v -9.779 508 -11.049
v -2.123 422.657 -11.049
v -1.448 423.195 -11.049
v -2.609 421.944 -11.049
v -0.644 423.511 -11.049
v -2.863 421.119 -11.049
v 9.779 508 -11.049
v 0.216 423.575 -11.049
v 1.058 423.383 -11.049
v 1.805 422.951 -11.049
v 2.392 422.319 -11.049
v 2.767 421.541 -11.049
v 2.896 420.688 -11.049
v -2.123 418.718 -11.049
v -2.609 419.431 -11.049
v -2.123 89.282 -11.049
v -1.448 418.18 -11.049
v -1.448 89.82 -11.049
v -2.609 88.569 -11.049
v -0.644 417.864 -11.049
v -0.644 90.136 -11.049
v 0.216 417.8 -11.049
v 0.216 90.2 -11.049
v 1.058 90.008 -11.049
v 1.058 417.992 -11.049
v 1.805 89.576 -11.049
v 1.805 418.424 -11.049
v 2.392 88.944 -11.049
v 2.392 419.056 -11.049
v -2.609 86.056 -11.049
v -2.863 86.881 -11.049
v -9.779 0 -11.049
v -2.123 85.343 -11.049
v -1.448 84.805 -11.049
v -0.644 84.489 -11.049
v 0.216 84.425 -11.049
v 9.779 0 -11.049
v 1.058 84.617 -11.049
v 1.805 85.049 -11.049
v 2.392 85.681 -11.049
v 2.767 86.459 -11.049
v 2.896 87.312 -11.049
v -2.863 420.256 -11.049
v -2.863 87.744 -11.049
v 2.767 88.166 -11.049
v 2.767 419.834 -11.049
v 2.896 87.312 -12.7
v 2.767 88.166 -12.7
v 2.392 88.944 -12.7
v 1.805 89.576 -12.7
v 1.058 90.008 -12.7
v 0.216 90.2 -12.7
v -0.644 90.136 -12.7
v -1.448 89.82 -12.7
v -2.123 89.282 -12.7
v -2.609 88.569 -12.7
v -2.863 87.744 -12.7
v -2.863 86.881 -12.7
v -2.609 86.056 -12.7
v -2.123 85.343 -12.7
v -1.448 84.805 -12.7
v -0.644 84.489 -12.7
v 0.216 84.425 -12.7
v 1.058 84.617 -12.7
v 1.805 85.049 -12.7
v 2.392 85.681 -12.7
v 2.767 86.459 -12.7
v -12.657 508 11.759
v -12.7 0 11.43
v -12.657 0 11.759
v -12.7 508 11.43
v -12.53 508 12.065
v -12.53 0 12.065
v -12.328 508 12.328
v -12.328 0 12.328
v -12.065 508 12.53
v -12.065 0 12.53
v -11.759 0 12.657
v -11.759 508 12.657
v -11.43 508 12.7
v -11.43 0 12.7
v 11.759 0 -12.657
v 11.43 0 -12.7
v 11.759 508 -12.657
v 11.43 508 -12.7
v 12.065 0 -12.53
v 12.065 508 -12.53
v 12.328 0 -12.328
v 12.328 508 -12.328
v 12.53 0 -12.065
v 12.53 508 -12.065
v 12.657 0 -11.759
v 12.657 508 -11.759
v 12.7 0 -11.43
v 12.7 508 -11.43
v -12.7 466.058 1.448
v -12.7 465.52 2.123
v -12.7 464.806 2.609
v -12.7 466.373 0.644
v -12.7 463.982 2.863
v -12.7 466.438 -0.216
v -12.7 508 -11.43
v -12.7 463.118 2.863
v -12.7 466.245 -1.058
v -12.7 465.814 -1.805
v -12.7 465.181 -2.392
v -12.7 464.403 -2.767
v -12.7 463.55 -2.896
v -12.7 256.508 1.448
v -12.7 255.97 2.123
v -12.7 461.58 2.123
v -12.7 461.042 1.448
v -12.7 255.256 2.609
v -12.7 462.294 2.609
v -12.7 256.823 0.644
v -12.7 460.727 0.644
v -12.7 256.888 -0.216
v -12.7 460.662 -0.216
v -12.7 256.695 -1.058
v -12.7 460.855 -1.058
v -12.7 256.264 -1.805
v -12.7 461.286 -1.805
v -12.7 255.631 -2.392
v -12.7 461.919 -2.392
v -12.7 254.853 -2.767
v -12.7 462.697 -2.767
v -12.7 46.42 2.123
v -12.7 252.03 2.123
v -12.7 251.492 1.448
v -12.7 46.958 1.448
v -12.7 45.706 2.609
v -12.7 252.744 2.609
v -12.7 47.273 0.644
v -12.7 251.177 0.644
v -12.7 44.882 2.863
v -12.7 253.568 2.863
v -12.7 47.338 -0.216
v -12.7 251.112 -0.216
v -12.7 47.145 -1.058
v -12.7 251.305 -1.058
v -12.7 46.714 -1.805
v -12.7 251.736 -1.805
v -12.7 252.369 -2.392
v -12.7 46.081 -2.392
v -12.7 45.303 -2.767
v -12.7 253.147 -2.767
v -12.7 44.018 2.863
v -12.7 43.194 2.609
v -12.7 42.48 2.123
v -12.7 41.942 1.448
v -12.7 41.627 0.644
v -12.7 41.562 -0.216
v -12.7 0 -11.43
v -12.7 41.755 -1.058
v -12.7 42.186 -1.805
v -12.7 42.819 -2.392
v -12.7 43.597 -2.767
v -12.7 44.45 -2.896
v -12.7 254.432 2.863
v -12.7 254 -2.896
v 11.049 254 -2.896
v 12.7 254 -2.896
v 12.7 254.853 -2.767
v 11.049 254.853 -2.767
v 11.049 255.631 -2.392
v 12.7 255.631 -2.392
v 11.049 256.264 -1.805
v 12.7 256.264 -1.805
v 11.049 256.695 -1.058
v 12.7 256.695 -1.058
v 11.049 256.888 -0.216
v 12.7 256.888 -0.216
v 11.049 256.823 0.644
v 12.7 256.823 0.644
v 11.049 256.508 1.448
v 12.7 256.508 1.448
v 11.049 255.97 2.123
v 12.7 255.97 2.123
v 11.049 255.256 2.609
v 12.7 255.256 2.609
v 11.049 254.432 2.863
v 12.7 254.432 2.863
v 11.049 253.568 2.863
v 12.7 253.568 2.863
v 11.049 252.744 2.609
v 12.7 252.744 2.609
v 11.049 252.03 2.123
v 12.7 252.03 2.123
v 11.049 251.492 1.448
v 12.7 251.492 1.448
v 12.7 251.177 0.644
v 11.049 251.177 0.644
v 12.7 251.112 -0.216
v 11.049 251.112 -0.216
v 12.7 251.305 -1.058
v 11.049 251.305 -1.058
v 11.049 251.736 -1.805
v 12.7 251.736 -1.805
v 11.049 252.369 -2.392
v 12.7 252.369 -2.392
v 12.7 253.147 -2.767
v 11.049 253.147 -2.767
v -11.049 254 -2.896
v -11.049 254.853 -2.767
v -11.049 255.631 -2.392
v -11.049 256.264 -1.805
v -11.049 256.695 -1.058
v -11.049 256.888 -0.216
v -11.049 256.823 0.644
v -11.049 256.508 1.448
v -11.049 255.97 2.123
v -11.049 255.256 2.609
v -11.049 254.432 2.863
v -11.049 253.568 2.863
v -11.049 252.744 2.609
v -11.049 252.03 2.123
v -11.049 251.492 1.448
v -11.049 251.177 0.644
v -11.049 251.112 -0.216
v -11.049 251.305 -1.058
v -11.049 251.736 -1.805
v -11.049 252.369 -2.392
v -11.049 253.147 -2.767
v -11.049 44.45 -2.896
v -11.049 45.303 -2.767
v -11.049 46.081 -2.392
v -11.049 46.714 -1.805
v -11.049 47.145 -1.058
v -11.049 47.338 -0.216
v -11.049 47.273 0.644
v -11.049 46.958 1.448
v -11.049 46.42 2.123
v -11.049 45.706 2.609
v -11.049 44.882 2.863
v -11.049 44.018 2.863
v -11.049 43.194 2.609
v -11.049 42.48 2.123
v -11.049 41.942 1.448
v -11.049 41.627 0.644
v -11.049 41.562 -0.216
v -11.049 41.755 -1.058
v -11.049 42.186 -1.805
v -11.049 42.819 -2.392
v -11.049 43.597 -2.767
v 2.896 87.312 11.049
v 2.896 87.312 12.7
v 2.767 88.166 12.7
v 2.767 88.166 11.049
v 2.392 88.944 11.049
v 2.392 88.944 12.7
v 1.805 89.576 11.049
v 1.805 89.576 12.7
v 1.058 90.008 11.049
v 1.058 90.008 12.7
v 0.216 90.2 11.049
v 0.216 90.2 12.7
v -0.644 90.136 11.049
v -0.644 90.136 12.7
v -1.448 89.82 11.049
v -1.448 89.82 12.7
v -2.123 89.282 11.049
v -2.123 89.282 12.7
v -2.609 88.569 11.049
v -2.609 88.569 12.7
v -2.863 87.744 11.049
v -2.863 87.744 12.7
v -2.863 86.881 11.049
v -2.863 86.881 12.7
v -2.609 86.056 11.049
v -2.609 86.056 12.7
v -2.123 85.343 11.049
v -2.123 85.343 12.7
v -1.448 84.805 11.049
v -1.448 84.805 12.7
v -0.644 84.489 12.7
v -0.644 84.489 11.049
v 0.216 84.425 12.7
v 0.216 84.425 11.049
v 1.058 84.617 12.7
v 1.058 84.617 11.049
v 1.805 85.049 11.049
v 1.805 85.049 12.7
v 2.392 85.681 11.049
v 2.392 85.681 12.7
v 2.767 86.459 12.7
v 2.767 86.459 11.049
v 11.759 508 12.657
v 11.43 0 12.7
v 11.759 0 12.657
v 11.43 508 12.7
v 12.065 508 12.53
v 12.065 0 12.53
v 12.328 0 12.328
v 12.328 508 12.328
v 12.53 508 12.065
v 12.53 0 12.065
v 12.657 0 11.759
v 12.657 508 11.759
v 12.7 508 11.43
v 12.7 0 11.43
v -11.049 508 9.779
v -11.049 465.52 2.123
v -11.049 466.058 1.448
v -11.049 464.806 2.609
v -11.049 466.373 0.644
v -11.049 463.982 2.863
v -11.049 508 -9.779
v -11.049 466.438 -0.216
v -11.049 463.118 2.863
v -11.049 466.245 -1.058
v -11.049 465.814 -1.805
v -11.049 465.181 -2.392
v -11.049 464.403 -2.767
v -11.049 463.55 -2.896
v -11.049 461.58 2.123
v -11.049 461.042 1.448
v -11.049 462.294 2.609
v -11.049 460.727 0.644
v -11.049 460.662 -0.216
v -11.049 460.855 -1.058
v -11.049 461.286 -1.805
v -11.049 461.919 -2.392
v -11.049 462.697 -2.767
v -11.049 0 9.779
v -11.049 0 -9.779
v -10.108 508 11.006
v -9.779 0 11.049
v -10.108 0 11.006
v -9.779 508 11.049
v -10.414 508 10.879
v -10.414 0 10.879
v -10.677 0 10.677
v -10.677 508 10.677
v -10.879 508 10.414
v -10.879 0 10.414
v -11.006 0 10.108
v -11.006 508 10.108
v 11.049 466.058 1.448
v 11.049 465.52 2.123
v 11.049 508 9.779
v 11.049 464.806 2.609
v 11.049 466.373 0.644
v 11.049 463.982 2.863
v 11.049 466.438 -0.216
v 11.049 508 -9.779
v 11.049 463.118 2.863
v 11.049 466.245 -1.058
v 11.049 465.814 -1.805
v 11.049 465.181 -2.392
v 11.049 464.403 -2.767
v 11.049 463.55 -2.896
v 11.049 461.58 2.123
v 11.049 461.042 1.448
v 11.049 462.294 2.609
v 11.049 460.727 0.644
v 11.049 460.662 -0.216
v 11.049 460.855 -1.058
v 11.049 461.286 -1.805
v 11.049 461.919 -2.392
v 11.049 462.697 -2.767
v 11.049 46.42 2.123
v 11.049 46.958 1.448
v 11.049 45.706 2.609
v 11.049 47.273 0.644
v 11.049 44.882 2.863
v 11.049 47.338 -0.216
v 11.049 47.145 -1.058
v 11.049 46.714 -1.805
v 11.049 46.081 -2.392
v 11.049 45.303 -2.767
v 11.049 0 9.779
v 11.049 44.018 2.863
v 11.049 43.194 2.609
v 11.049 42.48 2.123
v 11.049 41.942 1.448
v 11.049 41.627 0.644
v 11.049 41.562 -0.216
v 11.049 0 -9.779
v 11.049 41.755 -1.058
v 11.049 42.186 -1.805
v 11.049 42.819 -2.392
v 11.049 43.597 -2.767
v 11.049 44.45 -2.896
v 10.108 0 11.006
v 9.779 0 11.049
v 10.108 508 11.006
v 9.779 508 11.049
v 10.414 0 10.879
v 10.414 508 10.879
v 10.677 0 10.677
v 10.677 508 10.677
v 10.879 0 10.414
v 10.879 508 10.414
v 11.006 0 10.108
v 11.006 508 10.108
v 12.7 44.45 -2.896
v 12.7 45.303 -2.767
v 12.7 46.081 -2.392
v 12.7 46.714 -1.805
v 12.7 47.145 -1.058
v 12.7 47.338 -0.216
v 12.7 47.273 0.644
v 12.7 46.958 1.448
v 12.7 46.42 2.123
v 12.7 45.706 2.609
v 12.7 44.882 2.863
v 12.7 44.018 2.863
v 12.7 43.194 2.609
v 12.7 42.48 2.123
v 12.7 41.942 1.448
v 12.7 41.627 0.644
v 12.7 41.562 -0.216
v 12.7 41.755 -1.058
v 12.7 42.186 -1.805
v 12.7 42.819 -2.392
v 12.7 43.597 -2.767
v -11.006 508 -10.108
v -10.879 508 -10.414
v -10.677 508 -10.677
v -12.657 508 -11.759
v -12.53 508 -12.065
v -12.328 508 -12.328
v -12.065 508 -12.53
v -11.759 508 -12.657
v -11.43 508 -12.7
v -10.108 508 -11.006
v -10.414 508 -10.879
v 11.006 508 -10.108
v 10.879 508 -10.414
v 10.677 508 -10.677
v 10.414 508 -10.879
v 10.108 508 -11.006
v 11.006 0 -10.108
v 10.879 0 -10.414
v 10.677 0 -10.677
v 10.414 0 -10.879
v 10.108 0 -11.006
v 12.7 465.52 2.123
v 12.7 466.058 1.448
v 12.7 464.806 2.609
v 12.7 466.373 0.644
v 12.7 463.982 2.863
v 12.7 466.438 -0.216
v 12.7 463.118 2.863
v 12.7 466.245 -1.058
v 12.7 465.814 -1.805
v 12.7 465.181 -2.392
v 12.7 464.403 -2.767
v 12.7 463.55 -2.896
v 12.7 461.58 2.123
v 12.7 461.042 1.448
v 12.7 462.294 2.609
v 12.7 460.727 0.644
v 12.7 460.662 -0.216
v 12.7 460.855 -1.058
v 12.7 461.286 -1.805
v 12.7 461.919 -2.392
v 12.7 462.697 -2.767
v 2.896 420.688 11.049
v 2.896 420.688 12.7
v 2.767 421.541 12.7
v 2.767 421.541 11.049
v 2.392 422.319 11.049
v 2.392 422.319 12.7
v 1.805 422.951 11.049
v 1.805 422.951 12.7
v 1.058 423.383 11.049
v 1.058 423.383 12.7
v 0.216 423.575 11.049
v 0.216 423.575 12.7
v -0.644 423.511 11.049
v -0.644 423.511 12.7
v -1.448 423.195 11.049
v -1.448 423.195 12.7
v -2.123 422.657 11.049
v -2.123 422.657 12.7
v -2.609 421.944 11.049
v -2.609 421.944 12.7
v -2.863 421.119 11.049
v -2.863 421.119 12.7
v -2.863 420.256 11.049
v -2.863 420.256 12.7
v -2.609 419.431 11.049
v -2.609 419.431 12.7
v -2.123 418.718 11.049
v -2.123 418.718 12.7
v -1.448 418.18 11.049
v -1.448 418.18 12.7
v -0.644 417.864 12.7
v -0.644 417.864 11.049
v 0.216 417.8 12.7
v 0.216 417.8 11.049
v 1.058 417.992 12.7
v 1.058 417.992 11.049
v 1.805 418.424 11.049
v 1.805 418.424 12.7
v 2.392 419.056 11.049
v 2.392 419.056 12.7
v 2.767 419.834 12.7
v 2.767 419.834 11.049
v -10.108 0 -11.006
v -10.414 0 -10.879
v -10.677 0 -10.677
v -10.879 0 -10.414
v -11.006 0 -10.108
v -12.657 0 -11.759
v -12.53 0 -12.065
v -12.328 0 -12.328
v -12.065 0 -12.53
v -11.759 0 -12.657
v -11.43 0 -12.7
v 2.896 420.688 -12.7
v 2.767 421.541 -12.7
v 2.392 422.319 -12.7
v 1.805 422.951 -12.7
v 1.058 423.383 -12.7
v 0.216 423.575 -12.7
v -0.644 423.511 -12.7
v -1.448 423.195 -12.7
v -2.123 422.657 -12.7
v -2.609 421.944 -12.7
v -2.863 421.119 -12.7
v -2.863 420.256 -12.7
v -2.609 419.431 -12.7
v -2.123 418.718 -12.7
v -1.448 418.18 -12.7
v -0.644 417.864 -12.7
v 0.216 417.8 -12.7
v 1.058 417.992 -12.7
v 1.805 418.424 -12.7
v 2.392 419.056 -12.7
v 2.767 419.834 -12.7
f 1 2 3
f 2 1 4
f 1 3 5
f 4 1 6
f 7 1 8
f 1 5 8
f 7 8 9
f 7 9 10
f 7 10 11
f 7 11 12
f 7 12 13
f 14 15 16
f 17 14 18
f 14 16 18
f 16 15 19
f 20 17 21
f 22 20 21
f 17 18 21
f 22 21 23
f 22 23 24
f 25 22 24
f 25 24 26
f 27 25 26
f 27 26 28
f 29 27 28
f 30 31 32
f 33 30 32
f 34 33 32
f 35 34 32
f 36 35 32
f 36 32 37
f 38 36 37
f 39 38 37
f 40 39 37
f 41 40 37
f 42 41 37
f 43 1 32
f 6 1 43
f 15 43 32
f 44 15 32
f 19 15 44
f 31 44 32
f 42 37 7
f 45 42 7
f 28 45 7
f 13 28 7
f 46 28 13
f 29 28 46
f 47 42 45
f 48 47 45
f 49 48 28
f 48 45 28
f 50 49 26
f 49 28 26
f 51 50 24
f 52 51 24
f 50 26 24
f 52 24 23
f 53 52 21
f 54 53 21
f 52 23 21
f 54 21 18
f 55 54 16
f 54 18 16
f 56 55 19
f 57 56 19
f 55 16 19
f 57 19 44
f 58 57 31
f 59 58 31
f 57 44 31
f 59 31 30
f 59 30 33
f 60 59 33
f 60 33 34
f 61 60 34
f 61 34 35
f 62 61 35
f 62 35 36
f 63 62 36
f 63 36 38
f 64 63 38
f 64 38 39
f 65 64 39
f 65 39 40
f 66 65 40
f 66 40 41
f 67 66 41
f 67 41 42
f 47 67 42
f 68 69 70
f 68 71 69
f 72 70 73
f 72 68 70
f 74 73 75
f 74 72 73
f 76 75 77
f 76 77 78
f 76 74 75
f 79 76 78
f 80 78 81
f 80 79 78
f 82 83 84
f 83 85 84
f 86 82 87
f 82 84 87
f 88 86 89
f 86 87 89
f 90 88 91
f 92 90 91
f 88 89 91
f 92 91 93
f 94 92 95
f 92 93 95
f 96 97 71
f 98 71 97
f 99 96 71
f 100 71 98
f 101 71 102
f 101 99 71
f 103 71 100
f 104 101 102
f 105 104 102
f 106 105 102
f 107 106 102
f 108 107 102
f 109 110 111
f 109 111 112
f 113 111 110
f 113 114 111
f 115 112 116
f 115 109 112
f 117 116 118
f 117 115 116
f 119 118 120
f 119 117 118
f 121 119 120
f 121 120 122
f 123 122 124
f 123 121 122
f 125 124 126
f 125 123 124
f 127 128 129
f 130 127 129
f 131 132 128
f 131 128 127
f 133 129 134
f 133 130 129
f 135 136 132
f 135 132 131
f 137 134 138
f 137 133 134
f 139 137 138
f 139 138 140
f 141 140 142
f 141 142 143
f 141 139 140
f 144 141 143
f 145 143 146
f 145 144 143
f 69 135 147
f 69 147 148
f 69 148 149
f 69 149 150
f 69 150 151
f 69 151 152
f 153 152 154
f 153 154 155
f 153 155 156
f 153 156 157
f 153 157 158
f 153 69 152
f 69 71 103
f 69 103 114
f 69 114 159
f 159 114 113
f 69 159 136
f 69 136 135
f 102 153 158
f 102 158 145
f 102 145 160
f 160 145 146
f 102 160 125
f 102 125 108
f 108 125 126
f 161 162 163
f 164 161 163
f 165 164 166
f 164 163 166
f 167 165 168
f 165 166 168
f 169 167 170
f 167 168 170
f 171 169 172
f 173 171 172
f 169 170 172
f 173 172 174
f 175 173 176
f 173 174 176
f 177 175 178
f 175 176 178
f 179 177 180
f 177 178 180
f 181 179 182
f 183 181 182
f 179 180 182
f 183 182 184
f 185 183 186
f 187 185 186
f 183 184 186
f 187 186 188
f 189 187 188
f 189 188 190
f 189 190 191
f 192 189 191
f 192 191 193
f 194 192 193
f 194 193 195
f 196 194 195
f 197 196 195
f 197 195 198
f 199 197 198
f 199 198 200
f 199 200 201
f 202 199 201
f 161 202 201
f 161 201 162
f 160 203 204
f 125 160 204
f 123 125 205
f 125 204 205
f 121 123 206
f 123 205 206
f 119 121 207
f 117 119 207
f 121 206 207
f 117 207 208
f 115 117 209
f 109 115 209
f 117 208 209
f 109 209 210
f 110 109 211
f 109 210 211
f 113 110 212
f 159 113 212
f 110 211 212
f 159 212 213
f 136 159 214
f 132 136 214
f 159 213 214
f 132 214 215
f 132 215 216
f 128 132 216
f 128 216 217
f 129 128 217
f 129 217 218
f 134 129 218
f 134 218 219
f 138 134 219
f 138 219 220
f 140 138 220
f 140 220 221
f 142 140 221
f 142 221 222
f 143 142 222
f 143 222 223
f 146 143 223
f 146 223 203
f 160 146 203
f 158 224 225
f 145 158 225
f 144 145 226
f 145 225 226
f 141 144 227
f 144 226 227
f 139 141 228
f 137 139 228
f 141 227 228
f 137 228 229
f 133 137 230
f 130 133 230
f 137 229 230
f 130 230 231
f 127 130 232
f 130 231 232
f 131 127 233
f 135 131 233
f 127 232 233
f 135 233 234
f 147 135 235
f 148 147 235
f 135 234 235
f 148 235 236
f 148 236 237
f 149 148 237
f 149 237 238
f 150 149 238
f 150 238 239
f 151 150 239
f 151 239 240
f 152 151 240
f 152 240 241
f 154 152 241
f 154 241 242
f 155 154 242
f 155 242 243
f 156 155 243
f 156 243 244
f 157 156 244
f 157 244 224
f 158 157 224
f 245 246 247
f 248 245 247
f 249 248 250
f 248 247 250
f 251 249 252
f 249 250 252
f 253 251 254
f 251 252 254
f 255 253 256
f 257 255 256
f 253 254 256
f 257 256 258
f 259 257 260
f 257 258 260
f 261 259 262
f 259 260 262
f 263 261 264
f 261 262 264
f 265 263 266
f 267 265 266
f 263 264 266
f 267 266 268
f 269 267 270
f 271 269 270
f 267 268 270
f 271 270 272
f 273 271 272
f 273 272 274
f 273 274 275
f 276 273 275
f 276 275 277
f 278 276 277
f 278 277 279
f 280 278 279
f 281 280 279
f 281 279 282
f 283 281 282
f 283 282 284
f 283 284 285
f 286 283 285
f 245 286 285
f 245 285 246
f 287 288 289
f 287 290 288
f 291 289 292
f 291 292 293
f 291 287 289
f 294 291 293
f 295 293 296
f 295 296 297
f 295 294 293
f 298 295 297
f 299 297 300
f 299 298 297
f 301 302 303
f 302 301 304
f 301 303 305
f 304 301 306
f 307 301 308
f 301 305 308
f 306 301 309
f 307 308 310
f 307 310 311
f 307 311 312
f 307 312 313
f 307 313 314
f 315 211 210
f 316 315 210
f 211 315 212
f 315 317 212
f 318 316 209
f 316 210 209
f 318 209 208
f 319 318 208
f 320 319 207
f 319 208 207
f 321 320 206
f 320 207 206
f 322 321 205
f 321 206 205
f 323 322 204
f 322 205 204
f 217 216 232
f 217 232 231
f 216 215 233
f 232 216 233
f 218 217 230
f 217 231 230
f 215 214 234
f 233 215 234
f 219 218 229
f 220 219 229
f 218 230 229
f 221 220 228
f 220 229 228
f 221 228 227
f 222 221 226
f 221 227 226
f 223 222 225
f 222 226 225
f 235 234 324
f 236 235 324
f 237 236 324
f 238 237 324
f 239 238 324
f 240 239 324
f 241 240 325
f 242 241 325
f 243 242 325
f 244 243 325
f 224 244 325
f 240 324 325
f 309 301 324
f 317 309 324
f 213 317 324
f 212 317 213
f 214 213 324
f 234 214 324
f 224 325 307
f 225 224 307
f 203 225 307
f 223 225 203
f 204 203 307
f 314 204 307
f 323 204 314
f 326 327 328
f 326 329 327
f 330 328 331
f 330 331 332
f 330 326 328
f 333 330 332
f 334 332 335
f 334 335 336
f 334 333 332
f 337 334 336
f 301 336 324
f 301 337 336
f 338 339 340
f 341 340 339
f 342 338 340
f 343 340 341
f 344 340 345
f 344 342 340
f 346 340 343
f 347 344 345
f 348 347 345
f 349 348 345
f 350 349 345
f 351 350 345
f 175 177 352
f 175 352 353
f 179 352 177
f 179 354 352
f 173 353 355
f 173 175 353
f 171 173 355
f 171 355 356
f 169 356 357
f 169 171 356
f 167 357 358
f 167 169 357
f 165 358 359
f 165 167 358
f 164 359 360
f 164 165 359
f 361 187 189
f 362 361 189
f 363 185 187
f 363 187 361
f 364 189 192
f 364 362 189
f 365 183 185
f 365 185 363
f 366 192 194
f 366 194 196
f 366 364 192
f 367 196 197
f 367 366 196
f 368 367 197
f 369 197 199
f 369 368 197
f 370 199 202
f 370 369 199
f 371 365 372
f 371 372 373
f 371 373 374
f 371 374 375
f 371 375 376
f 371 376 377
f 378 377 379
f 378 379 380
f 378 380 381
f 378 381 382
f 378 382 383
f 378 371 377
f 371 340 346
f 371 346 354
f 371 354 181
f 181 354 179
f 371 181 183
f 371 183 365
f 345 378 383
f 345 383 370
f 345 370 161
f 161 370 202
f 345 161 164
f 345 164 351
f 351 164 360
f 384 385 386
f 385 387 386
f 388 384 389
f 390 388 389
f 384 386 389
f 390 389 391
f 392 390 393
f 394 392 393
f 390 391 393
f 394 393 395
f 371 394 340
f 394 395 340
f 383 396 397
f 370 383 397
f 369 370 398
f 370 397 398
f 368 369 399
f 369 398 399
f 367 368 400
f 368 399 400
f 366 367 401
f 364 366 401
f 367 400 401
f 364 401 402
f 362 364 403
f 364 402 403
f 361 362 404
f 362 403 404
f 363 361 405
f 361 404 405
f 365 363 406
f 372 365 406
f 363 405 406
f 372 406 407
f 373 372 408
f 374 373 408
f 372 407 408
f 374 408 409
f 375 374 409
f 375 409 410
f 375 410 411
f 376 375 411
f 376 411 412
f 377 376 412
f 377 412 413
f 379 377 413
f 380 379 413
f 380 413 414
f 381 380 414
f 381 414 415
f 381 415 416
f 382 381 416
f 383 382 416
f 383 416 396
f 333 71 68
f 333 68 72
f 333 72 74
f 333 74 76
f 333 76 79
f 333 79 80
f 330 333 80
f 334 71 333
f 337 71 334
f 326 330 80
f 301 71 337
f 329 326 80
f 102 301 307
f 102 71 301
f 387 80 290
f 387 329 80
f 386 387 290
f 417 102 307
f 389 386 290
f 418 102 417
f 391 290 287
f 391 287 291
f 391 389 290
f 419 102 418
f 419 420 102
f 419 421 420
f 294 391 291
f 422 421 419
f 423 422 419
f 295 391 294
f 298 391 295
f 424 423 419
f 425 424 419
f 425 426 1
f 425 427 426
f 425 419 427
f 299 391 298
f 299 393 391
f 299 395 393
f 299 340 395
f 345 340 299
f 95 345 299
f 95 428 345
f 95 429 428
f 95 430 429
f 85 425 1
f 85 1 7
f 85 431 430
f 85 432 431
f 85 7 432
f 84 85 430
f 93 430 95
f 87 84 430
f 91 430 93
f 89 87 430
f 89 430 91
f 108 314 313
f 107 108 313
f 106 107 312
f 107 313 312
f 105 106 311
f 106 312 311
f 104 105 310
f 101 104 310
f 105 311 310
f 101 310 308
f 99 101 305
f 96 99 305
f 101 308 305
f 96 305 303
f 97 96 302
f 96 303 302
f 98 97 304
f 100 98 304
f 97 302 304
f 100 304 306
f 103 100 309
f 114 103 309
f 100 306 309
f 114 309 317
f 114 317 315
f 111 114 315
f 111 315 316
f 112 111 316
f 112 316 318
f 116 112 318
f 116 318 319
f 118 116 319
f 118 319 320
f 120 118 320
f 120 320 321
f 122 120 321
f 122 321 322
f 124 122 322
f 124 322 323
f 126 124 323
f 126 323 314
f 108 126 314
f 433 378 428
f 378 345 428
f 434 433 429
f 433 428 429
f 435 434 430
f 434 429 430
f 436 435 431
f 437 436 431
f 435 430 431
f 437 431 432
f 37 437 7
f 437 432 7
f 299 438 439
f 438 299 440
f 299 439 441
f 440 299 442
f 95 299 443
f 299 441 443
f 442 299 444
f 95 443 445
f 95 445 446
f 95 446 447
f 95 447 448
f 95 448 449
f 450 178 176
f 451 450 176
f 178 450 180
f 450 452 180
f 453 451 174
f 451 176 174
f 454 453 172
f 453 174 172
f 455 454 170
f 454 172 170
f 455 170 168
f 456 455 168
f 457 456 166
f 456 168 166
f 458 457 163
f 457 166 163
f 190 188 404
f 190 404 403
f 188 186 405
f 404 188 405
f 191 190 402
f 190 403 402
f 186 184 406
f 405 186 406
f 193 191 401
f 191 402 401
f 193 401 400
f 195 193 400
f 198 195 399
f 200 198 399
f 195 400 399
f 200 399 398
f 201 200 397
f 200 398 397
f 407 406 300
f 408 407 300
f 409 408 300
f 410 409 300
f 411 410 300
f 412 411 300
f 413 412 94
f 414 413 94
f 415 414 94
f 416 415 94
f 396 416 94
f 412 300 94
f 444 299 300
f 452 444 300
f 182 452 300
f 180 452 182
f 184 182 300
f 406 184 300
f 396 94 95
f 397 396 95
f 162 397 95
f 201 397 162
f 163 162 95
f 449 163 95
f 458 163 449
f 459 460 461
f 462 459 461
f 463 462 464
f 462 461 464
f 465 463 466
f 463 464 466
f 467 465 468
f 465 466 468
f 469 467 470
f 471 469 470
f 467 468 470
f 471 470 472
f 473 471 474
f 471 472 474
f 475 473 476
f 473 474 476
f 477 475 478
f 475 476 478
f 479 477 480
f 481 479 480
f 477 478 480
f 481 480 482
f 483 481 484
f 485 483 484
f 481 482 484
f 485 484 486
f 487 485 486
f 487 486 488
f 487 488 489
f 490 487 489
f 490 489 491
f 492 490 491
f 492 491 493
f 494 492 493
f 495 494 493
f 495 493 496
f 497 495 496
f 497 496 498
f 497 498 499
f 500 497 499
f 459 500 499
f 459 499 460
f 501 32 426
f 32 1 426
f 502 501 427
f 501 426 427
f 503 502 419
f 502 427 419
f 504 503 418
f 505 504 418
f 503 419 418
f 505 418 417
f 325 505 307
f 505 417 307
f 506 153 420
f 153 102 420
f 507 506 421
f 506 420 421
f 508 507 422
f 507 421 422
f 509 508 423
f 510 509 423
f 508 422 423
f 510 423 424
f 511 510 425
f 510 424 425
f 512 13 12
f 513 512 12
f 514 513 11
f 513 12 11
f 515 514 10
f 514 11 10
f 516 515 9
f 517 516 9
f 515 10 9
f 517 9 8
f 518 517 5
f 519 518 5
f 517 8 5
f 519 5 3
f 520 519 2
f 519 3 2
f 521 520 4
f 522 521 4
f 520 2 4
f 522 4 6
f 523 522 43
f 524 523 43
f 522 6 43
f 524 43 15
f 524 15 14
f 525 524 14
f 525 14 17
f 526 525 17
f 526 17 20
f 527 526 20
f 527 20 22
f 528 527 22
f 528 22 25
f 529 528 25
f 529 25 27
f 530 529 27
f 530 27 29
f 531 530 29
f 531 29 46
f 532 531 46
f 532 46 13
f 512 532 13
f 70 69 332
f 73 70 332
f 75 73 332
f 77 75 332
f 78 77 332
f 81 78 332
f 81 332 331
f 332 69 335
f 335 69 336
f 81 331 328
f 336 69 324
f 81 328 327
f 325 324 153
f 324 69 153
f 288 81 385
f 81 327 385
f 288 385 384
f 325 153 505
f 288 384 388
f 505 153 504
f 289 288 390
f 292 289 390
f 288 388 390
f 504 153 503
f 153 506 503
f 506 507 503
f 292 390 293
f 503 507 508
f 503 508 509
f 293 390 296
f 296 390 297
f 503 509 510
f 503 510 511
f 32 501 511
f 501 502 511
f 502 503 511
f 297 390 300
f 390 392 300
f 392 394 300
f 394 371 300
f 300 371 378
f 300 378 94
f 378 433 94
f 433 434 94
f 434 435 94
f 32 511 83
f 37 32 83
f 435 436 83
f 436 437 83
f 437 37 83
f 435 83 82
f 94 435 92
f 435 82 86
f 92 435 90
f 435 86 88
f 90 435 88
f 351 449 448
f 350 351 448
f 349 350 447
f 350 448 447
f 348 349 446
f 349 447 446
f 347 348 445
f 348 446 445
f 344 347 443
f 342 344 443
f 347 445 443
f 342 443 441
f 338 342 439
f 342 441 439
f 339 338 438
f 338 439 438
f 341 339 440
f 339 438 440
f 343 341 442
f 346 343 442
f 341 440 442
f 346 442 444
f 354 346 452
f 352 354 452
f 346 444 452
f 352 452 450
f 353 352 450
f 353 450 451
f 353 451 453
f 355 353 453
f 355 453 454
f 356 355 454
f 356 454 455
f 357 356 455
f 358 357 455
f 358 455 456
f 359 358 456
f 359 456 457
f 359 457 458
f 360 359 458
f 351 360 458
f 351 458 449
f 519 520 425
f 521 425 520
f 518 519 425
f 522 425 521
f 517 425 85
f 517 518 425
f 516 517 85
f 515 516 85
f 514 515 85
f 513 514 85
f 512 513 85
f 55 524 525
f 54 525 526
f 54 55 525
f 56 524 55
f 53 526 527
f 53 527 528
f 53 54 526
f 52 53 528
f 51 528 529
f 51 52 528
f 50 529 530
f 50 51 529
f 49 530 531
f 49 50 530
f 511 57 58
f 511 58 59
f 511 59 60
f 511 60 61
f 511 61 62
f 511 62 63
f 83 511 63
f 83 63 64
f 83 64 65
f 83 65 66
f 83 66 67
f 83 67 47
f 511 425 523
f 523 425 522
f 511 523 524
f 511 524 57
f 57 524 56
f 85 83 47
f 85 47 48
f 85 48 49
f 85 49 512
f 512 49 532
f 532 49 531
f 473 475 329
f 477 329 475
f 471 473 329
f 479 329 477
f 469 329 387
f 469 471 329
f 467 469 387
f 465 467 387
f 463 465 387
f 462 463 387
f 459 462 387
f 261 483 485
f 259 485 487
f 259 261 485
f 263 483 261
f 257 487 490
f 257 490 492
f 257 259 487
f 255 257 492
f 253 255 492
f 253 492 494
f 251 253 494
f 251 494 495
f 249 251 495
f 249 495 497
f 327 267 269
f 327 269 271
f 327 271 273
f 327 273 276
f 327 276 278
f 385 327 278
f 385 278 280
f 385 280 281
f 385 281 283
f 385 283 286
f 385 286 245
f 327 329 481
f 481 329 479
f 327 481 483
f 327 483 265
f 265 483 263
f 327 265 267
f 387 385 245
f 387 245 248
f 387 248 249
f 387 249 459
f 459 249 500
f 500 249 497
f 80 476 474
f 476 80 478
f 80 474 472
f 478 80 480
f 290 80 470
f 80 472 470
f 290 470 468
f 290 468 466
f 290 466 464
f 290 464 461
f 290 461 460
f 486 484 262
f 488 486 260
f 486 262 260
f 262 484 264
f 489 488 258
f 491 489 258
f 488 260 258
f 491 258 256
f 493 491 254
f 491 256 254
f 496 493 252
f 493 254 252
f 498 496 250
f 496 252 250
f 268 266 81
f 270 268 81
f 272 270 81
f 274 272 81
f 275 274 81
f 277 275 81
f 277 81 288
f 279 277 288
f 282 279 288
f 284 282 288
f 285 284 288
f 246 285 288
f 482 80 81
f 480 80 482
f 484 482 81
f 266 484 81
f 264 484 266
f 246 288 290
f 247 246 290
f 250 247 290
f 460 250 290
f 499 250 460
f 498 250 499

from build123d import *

# Parameters (mm, degrees)
SKETCH1_W                  = 25.4
SKETCH1_H                  = 25.4
SKETCH1_W_2                = 22.098
SKETCH1_H_2                = 22.098
BOSS_EXTRUDE1_DEPTH        = 508
FILLET1_R                  = 1.27
F_1_0_228_DIAMETER_HOLE2_D = 5.7912
F_1_0_228_DIAMETER_HOLE3_D = 5.7912


with BuildPart() as part:
    # Sketch1 → Boss-Extrude1 (new body)
    with BuildSketch(Plane(origin=(0, 0, 0), x_dir=(1, 0, 0), z_dir=(0, 1, 0))):
        Rectangle(SKETCH1_W, SKETCH1_H)
        Rectangle(SKETCH1_W_2, SKETCH1_H_2, mode=Mode.SUBTRACT)
    extrude(amount=BOSS_EXTRUDE1_DEPTH)

    # Fillet1
    fillet1_edges = [part.edges().sort_by_distance(p)[0] for p in [
        (-11.049, 254, 11.049),
        (11.049, 254, 11.049),
        (11.049, 254, -11.049),
        (-11.049, 254, -11.049),
        (12.7, 254, 12.7),
        (-12.7, 254, 12.7),
        (-12.7, 254, -12.7),
        (12.7, 254, -12.7),
    ]]
    fillet(fillet1_edges, radius=FILLET1_R)

    # #1 (0.228) Diameter Hole2 (through all)
    with Locations(Plane.ZY.offset(12.7)):
        with Locations((0, 463.55), (0, 44.45), (0, 254)):
            Hole(F_1_0_228_DIAMETER_HOLE2_D / 2)

    # #1 (0.228) Diameter Hole3 (through all)
    with Locations(Plane(origin=(0, 0, -12.7), x_dir=(-1, 0, 0), z_dir=(0, 0, -1))):
        with Locations((0, 420.6875), (0, 87.3125)):
            Hole(F_1_0_228_DIAMETER_HOLE3_D / 2)


solid = part.part
